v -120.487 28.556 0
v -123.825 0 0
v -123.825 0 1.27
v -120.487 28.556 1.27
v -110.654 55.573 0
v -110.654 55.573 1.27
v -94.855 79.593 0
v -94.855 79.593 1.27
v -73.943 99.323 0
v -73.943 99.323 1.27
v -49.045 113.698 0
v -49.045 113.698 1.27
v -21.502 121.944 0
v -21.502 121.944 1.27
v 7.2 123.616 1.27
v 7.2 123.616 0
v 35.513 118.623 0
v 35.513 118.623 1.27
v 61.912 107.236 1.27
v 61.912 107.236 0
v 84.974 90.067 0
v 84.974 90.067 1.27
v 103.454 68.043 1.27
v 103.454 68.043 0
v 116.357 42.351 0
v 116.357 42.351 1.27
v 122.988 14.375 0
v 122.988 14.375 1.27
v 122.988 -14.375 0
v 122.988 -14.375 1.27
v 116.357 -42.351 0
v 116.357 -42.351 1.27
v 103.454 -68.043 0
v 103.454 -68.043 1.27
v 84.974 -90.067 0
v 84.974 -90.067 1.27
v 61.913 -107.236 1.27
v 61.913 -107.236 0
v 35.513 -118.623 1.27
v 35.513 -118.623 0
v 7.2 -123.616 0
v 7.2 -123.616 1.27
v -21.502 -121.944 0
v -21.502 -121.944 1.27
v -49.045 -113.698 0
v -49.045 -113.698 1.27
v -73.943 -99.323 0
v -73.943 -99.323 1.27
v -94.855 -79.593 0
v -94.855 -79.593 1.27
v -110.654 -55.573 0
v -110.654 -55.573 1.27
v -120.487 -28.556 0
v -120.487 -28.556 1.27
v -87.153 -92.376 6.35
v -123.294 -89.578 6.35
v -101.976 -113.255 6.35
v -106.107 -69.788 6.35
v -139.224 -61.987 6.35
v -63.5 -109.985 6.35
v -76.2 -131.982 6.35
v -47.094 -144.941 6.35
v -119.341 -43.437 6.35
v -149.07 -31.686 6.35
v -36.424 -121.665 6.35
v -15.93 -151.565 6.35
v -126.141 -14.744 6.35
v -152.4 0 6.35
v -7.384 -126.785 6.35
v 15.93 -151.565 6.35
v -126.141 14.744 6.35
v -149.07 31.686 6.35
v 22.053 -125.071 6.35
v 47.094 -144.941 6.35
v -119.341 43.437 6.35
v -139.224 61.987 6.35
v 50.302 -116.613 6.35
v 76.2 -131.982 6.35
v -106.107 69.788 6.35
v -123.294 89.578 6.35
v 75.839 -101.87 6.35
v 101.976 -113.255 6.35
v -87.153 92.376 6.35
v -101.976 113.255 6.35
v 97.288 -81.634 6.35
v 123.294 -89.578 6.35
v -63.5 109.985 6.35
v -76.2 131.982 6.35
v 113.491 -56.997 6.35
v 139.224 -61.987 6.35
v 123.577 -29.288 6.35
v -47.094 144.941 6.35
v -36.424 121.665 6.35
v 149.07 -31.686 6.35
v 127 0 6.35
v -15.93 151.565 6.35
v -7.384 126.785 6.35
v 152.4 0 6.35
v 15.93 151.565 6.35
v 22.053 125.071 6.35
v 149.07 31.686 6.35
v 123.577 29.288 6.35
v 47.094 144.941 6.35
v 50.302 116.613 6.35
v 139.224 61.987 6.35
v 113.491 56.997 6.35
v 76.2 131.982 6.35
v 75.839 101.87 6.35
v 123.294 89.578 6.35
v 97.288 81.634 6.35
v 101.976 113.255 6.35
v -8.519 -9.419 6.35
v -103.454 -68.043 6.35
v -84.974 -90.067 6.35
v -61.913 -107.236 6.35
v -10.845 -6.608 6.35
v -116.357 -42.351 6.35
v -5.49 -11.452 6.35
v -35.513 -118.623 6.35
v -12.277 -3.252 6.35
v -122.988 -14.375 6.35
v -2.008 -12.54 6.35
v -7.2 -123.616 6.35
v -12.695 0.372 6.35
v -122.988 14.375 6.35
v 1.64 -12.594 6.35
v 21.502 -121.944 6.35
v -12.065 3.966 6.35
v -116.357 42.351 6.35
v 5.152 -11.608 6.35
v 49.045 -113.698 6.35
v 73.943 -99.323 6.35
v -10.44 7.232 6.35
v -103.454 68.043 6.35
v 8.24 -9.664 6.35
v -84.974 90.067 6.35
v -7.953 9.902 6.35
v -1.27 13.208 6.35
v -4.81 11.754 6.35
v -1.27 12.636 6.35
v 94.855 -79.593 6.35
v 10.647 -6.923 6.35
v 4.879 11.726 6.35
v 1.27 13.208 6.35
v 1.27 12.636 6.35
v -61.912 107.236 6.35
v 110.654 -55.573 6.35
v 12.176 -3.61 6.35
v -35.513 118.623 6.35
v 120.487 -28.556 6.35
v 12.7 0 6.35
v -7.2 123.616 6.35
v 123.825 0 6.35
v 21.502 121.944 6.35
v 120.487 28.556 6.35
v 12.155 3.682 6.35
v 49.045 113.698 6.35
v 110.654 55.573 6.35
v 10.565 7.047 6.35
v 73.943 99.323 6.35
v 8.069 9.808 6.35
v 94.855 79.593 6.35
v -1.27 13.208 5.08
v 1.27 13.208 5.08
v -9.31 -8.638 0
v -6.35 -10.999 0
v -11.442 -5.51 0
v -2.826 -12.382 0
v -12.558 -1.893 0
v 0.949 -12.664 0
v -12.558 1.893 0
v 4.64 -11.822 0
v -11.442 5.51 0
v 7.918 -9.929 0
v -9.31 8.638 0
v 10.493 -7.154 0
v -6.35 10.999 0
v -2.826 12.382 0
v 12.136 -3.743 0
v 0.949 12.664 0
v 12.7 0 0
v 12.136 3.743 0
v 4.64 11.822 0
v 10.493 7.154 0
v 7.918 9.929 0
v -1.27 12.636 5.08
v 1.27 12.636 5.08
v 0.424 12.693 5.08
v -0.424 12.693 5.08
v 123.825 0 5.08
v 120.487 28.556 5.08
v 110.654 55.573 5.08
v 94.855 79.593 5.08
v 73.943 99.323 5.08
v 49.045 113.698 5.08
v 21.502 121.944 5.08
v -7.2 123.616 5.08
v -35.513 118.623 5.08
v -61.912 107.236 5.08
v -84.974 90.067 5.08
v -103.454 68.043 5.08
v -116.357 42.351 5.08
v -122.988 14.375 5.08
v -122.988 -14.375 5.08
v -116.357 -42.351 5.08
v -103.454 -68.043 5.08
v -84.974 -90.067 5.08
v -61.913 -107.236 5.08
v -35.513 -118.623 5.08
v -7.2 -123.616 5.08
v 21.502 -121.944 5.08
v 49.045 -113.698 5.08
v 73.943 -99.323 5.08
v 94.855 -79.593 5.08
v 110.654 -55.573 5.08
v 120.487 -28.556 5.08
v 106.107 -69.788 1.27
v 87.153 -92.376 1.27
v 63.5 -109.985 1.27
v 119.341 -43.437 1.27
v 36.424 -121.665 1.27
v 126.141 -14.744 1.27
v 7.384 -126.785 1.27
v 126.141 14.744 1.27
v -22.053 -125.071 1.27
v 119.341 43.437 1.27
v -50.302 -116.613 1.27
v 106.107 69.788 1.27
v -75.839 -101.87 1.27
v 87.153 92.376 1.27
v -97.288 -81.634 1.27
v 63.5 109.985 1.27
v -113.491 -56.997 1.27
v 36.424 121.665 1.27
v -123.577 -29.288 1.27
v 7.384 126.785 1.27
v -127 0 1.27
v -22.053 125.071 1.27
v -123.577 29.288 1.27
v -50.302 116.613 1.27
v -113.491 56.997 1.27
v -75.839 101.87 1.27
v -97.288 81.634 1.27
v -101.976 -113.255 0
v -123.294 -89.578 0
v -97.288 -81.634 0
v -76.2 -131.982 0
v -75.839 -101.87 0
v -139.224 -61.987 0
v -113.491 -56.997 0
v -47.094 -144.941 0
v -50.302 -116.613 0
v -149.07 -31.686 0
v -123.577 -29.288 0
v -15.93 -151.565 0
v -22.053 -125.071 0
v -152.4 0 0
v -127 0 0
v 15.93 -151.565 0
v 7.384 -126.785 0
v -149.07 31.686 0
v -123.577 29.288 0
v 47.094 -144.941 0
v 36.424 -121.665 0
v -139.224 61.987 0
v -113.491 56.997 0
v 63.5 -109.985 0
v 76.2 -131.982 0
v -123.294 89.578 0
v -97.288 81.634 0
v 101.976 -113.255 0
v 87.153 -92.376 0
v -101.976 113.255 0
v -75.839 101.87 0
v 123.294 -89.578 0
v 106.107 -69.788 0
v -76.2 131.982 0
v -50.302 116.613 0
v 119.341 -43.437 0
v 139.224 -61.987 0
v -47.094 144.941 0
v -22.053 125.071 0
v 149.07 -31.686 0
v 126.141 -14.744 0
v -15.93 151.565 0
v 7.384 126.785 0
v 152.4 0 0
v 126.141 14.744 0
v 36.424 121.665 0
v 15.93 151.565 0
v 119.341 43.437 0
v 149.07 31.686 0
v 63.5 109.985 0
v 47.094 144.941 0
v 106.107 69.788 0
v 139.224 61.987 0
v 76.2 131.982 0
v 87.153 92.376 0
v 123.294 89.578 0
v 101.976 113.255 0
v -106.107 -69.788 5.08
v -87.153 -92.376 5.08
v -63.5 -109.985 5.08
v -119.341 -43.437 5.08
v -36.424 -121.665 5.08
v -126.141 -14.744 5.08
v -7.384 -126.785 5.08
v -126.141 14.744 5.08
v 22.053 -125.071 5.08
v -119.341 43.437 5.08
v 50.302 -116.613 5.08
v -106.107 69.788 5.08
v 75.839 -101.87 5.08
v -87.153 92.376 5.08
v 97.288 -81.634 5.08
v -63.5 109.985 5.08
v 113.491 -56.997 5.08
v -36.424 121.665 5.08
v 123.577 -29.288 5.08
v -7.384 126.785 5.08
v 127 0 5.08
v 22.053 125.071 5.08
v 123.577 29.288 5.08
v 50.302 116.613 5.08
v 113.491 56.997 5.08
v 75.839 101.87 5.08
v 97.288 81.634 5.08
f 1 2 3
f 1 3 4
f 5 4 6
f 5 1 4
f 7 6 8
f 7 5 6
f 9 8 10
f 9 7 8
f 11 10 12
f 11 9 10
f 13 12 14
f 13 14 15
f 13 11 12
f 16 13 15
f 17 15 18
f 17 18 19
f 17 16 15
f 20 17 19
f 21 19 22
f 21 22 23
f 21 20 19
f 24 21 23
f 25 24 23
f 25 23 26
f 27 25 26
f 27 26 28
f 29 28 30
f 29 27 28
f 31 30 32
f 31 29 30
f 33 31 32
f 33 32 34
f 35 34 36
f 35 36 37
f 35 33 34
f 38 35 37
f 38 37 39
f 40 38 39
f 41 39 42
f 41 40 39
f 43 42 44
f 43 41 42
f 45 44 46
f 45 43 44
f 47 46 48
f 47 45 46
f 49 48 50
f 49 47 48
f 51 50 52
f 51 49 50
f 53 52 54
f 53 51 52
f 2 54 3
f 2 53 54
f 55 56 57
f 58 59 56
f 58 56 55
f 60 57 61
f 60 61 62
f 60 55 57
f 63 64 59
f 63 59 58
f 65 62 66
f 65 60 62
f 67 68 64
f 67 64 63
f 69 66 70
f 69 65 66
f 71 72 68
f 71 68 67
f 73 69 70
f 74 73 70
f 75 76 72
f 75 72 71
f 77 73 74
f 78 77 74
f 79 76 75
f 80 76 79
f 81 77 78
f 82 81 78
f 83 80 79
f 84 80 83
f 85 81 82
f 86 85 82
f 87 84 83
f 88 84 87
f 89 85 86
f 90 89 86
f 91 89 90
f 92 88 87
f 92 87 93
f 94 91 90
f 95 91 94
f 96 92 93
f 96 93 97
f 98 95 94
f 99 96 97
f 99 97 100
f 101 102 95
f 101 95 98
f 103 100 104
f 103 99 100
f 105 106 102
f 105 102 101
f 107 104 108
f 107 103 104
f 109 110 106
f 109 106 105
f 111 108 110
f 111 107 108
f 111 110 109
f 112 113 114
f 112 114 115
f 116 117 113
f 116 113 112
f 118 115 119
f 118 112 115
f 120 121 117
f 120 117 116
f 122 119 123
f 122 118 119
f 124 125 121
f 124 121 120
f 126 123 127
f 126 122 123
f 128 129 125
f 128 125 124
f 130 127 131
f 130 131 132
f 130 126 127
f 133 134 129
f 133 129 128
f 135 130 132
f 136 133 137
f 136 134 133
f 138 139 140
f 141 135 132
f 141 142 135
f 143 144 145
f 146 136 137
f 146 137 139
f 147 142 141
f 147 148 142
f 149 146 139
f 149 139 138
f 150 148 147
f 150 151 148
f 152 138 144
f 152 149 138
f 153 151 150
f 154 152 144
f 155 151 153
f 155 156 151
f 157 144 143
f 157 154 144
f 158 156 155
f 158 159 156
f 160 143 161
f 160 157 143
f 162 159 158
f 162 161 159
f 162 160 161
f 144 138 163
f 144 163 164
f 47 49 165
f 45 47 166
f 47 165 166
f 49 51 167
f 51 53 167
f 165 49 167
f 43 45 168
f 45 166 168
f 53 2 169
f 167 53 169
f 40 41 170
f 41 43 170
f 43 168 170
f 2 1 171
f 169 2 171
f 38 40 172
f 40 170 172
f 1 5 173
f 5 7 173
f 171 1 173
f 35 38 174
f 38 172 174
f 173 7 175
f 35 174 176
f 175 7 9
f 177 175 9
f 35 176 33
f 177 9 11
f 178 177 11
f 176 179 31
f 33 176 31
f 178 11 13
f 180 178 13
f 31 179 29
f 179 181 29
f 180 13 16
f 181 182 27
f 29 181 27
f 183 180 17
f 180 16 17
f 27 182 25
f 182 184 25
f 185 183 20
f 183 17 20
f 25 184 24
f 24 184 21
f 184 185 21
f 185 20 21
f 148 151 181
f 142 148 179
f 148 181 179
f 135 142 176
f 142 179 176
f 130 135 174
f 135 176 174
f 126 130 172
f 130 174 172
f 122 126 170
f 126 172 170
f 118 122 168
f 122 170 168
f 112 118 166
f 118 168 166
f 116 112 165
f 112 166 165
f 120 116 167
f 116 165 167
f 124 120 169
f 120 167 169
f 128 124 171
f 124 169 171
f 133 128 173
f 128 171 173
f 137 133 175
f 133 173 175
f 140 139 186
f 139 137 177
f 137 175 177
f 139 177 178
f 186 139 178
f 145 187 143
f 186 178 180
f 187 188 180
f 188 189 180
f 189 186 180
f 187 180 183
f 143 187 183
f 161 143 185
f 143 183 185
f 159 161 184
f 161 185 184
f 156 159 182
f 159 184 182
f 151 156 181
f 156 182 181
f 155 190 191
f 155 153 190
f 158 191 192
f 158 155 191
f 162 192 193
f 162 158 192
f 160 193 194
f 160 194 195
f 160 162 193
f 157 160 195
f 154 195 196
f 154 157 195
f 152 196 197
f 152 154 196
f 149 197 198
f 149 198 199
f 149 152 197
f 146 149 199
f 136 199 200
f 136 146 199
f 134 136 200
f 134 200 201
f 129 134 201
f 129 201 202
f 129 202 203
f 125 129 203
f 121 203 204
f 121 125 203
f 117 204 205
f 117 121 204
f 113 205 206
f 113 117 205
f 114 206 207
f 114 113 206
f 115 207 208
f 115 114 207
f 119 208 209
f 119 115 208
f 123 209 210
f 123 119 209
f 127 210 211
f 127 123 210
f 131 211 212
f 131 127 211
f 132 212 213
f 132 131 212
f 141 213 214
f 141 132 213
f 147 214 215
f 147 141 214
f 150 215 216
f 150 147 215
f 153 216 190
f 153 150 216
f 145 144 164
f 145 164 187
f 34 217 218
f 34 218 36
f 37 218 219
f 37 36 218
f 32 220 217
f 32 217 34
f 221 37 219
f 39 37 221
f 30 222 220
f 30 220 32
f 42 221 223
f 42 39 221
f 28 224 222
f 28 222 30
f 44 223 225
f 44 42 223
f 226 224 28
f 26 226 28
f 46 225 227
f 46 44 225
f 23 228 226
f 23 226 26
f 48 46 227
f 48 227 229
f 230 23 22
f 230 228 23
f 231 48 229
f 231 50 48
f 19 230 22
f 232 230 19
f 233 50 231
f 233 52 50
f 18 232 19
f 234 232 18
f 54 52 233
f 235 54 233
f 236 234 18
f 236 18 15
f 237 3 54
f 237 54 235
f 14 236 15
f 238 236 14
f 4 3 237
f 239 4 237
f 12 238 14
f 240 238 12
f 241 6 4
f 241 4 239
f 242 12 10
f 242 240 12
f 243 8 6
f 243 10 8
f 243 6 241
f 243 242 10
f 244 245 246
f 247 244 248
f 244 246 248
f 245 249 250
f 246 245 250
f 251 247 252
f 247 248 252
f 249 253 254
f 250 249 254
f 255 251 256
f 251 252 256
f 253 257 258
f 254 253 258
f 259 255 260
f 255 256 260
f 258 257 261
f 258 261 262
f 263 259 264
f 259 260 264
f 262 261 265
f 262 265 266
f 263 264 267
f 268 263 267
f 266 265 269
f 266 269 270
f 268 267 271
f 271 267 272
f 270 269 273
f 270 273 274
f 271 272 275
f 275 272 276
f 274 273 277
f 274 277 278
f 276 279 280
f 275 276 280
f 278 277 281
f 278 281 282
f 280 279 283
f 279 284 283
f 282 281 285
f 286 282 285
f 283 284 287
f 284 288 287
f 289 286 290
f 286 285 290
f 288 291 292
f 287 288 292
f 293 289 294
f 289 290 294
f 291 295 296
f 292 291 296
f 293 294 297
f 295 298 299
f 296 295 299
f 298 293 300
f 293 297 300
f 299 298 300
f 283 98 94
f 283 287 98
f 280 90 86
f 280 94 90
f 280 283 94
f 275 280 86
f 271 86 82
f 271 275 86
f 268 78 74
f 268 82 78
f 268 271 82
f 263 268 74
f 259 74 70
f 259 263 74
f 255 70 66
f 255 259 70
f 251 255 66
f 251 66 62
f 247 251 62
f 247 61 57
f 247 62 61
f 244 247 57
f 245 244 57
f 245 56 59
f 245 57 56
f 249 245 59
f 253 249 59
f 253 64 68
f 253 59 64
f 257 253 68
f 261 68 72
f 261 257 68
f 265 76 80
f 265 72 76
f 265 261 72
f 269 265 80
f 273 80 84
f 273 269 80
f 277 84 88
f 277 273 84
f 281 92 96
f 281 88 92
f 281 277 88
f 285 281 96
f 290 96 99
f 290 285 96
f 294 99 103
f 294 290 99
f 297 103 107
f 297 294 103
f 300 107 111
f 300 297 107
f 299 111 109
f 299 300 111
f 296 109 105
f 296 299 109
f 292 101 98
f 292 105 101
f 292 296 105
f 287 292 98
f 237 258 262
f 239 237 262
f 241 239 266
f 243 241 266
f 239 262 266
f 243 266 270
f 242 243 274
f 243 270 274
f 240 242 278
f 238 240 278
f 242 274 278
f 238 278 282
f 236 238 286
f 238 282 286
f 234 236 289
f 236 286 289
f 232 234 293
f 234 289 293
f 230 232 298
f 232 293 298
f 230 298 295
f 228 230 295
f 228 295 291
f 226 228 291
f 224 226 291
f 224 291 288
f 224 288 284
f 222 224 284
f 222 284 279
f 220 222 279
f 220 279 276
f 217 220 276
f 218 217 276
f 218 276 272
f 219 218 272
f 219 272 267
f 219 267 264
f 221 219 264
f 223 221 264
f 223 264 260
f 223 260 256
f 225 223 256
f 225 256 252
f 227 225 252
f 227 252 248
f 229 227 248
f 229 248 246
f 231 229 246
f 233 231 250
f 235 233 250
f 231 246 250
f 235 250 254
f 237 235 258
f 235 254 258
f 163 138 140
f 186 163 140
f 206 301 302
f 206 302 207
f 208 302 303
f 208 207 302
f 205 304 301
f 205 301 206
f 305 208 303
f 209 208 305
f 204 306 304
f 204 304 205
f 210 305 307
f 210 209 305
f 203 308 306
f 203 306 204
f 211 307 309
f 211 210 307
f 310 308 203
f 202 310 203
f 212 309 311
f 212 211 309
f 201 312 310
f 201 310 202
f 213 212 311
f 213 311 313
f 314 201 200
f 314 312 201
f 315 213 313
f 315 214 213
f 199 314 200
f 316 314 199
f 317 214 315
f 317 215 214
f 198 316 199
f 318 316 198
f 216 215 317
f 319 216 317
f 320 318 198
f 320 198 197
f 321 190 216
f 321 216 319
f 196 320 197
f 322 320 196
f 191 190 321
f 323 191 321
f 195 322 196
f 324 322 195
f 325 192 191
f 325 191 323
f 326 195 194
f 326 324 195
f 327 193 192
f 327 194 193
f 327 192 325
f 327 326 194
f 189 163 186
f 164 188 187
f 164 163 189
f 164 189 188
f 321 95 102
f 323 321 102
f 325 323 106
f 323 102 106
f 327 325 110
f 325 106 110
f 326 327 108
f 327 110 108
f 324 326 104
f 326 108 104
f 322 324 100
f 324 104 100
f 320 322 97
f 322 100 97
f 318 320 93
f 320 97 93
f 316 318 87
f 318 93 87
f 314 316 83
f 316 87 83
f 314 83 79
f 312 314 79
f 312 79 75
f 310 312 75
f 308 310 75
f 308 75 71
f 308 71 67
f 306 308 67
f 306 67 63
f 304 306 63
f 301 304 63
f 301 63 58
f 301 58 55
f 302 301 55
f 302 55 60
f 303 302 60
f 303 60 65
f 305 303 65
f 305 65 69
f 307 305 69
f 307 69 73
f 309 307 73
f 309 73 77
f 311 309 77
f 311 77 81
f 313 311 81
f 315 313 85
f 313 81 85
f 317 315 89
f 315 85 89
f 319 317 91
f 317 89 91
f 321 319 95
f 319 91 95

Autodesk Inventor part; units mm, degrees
ref_plane "YZ Plane" through (0, 0, 0) normal (1, 0, 0) x (0, 1, 0)
ref_plane "XZ Plane" through (0, 0, 0) normal (0, 1, 0) x (-1, 0, 0)
ref_plane "XY Plane" through (0, 0, 0) normal (0, 0, 1) x (1, 0, 0)
sketch "Sketch1" plane through (0, 0, 0) normal (0, 0, 1) x (1, 0, 0)
  circle A0 centre (0, 0) radius 152.4
  circle A1 centre (0, 0) radius 12.7
  dimension "d0" = 304.8
  dimension "d1" = 25.4
extrude "Extrusion1" add sketch "Sketch1" along normal blind 6.35
sketch "Sketch2" plane through (0, 0, 6.35) normal (0, 0, 1) x (1, 0, 0)
  point P0 (0, 0)
sketch "Sketch3" plane through (0, 0, 6.35) normal (0, 0, 1) x (1, 0, 0)
  circle A0 centre (0, 0) radius 127
  circle A1 centre (0, 0) radius 123.825
  dimension "d4" = 254
  dimension "d5" = 247.65
extrude "Extrusion2" cut sketch "Sketch3" against normal blind 1.27
sketch "Sketch4" plane through (0, 0, 0) normal (0, 0, -1) x (-1, 0, 0)
  circle A0 centre (0, 0) radius 152.4
  circle A1 centre (0, 0) radius 127
  circle A2 centre (0, 0) radius 123.825
  dimension "d8" = 254
  dimension "d9" = 247.65
extrude "Extrusion3" cut sketch "Sketch4" against normal blind 1.27 contours A1
sketch "Sketch5" plane through (0, 0, 6.35) normal (0, 0, 1) x (1, 0, 0)
  circle A0 centre (0, 0) radius 12.7 projected
  line L0 (0, 12.7) -> (0, 13.208)
  line L1 (0, 13.208) -> (1.27, 13.208)
  line L2 (0, 13.208) -> (-1.27, 13.208)
  line L3 (-1.27, 13.208) -> (-1.27, 12.2678)
  line L4 (1.27, 13.208) -> (1.27, 12.2294)
  arc A1 (1.27, 12.6363) -> (-1.27, 12.6363) centre (0, 0) ccw
  dimension "d12" = 0.508
  dimension "d15" = 1.27
  dimension "d16" = 1.27
extrude "Extrusion4" cut sketch "Sketch5" against normal blind 1.27 contours A0 L0 L1 L4 | L3 L2 L0 A0
properties part number "PlateCenter"
